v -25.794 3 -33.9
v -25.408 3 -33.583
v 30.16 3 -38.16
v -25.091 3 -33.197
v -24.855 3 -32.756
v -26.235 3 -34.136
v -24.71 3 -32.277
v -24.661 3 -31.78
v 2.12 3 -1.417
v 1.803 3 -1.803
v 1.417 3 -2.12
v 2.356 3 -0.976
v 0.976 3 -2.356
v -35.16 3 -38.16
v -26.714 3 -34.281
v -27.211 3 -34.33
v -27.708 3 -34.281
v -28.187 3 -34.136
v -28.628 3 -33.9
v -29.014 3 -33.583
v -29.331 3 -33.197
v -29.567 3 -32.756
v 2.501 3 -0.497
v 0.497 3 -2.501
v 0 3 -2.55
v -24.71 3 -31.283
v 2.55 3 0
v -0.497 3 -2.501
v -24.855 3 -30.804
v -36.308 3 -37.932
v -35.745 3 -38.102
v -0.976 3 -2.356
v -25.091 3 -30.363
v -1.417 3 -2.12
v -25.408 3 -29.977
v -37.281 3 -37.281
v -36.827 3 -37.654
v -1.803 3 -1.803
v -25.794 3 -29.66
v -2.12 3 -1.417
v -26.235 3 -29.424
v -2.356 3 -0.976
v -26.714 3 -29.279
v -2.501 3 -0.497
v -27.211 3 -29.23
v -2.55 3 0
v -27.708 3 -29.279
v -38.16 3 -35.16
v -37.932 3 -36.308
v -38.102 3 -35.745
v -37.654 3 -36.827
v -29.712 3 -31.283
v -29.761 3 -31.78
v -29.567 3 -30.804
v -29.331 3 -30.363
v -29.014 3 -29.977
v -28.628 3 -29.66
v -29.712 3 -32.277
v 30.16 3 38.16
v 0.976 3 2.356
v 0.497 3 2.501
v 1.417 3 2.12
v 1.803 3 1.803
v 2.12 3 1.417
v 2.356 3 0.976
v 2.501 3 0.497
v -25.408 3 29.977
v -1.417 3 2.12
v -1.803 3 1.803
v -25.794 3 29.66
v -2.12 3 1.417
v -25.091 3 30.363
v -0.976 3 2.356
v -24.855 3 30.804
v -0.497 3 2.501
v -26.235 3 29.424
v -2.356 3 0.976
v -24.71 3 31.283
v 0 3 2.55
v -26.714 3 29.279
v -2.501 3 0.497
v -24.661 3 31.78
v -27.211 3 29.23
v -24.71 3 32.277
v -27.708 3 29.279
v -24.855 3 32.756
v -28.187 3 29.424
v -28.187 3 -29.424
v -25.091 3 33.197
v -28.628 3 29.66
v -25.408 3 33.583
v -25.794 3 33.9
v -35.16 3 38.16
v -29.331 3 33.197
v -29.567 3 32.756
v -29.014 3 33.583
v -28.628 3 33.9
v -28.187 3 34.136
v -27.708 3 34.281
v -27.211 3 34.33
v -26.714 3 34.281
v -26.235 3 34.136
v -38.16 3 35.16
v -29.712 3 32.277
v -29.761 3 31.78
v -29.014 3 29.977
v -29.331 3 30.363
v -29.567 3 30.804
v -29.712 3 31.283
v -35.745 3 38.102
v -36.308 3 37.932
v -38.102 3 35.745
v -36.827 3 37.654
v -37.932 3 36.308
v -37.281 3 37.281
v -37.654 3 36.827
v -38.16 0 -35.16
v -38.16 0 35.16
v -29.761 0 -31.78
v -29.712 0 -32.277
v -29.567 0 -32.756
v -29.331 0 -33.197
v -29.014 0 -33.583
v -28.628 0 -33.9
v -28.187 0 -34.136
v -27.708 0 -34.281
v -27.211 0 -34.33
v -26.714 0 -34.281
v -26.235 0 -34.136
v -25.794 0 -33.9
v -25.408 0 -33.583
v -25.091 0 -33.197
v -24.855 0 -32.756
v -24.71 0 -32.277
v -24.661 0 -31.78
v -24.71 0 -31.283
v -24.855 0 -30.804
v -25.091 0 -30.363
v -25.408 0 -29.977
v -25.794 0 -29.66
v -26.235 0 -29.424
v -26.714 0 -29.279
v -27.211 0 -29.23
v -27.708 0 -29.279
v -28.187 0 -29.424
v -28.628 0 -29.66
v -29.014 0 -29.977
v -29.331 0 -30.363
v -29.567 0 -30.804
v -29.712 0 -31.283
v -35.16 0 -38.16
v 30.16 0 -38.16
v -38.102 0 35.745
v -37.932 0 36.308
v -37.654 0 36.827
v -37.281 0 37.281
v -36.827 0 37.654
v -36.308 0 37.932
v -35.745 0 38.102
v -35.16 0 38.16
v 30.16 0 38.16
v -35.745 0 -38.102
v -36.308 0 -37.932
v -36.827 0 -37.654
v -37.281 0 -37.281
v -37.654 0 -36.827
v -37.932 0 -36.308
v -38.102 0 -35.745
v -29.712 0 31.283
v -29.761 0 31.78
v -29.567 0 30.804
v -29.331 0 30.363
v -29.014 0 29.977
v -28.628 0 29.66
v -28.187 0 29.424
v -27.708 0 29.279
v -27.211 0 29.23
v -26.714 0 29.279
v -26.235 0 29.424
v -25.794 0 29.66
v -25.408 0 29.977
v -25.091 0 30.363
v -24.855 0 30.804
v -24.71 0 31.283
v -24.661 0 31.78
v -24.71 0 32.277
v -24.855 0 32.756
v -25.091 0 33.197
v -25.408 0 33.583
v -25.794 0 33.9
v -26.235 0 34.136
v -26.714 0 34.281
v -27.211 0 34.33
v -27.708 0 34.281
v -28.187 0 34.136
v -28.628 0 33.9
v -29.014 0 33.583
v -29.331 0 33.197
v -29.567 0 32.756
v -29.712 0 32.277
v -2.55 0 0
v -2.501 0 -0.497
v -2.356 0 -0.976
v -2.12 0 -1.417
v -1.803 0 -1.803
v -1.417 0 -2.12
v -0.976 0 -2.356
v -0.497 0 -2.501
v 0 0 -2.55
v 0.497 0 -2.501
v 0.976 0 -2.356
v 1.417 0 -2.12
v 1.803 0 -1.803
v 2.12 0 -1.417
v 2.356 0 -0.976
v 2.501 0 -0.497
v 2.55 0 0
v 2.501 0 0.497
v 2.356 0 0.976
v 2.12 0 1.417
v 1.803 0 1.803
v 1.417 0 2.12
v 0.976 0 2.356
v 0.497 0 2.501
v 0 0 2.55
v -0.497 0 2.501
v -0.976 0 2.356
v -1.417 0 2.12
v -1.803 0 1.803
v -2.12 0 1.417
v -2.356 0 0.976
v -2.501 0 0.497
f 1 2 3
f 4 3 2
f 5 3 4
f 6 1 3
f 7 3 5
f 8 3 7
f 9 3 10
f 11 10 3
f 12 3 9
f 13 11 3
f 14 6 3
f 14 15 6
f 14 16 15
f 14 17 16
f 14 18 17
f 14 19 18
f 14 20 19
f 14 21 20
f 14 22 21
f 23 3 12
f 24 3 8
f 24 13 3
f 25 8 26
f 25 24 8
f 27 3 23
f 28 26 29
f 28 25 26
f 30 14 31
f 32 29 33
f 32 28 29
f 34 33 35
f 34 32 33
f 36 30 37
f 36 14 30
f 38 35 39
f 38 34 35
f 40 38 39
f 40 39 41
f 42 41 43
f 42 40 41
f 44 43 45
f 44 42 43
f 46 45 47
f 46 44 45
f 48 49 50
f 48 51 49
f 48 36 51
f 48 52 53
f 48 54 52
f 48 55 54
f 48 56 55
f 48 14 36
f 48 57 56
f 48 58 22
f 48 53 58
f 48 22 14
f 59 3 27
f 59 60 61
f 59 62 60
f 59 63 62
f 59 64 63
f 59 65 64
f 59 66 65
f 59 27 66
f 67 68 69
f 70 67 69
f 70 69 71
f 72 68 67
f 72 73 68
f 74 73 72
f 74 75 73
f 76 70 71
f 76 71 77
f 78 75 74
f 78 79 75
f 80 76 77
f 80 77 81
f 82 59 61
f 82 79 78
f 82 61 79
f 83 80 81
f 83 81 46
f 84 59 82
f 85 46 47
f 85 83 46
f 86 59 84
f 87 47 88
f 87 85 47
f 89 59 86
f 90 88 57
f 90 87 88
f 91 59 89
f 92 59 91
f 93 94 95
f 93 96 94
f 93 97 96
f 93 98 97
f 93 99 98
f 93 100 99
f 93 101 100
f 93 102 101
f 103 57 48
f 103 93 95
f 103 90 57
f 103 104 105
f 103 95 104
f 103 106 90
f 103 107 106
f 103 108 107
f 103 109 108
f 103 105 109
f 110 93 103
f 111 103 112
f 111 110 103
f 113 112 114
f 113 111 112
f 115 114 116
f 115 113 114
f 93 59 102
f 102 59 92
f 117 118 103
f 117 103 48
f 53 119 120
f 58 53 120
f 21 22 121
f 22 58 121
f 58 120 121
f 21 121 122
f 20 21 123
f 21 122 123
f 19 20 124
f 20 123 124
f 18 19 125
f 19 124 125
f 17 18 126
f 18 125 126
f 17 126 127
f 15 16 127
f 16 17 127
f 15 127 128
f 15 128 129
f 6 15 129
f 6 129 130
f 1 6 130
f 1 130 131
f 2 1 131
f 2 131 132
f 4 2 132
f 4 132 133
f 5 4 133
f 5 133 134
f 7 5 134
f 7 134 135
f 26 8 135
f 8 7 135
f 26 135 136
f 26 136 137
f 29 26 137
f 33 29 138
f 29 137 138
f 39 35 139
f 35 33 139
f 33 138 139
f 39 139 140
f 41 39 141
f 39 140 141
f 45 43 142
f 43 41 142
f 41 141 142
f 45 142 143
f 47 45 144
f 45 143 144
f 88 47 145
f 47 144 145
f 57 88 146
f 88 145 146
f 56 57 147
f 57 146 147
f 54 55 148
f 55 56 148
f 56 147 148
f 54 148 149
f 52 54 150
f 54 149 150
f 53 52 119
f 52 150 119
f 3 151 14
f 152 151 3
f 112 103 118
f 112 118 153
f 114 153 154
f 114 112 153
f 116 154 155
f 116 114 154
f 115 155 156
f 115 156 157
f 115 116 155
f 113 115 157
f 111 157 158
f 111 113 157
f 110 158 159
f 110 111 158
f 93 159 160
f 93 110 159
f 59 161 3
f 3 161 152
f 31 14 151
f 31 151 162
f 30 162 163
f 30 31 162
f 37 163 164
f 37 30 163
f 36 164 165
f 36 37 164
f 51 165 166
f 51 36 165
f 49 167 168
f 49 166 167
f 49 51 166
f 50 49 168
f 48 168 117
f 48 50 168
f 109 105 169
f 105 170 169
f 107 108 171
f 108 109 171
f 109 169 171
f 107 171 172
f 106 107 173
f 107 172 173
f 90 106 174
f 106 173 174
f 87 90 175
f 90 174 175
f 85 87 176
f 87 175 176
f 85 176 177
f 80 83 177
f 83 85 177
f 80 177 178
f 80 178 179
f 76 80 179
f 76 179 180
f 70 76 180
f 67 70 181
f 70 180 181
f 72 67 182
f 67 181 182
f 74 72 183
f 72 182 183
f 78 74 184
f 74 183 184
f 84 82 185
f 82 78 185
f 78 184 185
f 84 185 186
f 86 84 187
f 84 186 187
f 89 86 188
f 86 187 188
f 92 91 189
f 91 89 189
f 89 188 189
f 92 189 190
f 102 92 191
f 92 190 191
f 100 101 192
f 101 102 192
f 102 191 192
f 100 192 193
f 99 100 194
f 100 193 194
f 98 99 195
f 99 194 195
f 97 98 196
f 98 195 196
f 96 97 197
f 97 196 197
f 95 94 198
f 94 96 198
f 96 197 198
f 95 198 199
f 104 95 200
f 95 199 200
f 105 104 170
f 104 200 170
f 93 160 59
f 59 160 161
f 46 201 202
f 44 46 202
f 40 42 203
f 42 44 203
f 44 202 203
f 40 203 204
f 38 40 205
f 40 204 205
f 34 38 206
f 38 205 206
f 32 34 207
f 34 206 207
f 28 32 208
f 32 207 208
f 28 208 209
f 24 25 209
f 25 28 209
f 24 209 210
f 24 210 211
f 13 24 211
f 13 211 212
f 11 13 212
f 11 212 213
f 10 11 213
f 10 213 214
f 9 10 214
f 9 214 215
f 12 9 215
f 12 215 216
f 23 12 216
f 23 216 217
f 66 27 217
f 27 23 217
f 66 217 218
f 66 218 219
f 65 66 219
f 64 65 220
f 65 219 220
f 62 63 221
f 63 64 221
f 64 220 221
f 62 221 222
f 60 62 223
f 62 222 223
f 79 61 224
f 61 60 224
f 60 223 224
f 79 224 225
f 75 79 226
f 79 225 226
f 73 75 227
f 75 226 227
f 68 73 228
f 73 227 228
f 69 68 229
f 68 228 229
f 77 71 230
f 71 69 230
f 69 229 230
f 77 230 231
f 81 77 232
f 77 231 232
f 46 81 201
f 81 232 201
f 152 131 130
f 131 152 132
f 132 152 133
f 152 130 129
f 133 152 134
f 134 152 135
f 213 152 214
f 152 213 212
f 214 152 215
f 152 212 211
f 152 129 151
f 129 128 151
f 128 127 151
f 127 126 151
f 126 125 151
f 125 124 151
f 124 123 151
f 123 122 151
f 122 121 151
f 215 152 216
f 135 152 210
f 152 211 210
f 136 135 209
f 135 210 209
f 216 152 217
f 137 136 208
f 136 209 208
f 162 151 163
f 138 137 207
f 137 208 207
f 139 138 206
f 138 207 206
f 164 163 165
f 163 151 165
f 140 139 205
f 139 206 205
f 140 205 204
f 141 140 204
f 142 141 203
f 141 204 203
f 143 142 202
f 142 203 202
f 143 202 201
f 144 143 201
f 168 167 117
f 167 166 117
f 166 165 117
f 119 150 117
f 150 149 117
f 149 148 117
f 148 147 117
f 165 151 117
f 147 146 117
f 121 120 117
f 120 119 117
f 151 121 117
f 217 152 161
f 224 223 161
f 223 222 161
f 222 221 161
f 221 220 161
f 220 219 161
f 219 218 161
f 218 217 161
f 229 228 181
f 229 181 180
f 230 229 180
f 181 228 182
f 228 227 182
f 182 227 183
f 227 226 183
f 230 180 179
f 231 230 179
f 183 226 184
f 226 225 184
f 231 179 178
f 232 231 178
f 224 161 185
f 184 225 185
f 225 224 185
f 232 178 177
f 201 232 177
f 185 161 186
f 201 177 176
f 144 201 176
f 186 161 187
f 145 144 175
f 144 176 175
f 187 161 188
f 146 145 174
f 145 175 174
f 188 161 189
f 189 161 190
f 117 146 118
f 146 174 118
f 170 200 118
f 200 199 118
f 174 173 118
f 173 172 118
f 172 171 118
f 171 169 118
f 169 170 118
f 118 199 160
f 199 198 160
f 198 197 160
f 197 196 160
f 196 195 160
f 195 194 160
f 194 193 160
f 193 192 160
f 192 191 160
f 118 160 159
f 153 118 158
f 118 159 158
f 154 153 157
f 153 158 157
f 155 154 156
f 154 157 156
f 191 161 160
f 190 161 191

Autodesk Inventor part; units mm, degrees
ref_plane "YZ Plane" through (0, 0, 0) normal (1, 0, 0) x (0, 1, 0)
ref_plane "XZ Plane" through (0, 0, 0) normal (0, 1, 0) x (-1, 0, 0)
ref_plane "XY Plane" through (0, 0, 0) normal (0, 0, 1) x (1, 0, 0)
sketch "Sketch2" plane through (0, 0, 0) normal (0, 1, 0) x (-1, 0, 0)
  circle A0 centre (0, 0) radius 30.16 construction
  line L0 (0, 0) -> (38.16, 0) construction
  line L1 (38.16, 38.16) -> (38.16, -38.16)
  line L2 (38.16, 38.16) -> (-30.16, 38.16)
  line L3 (38.16, -38.16) -> (-30.16, -38.16)
  circle A1 centre (27.211, 31.78) radius 2.55
  circle A2 centre (27.211, -31.78) radius 2.55
  circle A3 centre (0, 0) radius 2.55
  line L4 (-30.16, 38.16) -> (-30.16, -38.16)
  dimension "d12" = 60.32
  dimension "d13" = 38.16
  dimension "d14" = 76.32
  dimension "d15" = 5.1
  dimension "d17" = 6.38
  dimension "d18" = 10.949
  dimension "d19" = 5.1
extrude "Extrusion2" add sketch "Sketch2" along normal blind 3
fillet "Fillet2" radius 3 2 edges at (-38.16, 1.5, 38.16) (-38.16, 1.5, -38.16)
properties part number "Tapa" material "PMMA Plastic"
